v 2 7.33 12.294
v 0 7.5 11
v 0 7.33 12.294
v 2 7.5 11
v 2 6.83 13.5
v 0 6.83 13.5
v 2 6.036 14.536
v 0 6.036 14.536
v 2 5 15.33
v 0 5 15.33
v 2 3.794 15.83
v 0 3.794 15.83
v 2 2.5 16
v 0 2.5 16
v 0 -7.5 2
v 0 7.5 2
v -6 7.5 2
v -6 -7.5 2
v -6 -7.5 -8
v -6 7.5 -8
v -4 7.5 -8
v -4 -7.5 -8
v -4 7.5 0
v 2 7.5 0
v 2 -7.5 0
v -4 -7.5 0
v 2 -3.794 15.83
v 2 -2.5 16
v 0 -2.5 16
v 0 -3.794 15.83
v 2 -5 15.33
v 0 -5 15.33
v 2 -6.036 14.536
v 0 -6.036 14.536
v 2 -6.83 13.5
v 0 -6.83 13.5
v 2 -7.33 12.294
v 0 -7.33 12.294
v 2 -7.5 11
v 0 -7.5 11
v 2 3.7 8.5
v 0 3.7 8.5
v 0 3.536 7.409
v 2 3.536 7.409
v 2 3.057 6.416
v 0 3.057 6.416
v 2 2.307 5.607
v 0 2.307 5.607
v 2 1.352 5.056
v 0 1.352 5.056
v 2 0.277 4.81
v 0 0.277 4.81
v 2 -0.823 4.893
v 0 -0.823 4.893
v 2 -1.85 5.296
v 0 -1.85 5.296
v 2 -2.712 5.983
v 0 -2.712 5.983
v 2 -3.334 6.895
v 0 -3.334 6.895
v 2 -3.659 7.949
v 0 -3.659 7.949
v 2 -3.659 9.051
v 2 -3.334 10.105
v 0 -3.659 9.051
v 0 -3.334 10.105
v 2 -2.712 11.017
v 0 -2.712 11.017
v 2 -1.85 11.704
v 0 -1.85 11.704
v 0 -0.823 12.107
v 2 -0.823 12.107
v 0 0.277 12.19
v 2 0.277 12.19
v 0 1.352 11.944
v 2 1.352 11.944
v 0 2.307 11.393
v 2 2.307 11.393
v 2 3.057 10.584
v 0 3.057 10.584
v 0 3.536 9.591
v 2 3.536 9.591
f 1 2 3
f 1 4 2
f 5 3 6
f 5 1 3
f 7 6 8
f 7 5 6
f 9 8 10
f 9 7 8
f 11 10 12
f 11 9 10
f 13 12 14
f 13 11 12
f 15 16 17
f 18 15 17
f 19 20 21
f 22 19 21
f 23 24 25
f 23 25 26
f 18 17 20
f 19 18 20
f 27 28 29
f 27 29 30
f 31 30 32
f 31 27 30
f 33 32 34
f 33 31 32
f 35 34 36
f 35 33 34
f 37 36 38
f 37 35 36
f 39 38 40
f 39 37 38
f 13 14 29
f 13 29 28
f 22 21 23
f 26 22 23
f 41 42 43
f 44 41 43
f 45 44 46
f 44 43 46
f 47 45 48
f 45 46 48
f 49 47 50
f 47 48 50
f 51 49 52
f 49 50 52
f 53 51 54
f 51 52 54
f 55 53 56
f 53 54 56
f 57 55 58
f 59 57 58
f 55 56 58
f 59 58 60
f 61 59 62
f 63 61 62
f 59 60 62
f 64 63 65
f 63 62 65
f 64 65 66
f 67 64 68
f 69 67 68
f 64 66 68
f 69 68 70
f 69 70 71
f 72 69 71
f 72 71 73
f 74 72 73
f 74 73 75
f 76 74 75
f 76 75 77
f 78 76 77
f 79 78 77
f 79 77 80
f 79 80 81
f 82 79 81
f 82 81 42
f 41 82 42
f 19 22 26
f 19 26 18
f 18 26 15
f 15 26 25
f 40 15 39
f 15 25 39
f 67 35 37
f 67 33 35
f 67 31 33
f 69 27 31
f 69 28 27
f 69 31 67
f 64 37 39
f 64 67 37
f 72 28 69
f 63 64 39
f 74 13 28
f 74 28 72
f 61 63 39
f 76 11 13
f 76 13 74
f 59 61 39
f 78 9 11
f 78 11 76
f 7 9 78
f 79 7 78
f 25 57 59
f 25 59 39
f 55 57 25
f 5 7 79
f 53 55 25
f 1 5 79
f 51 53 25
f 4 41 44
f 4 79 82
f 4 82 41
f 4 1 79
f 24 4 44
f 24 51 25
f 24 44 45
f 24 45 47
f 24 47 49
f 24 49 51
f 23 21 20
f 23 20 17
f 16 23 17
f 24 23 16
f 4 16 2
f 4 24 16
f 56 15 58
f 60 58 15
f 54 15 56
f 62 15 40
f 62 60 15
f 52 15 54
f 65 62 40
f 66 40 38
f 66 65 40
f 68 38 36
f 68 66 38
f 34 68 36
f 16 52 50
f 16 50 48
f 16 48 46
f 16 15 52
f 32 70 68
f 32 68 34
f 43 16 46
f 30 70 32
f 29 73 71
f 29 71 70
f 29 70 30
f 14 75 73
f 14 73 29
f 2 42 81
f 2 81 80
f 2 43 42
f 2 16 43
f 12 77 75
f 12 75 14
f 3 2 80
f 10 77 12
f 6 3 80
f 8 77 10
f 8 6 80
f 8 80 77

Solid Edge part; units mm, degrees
sketch "Sketch1" plane through (0, 0, 0) normal (0, -1, 0) x (1, 0, 0)
  line L0 (2, 16) -> (2, 2)
  line L1 (2, 2) -> (2, 0)
  line L2 (2, 0) -> (0, 0)
  line L3 (-4, 0) -> (0, 0)
  line L4 (-4, -8) -> (-4, 0)
  line L5 (-6, -8) -> (-4, -8)
  line L6 (-6, 2) -> (-6, -8)
  line L7 (0, 2) -> (-6, 2)
  line L8 (0, 2) -> (0, 16)
  line L9 (0, 16) -> (2, 16)
extrude "Protrusion1" add sketch "Sketch1" along normal mid plane 15
sketch "Sketch2" plane through (0, 0, 0) normal (1, 0, 0) x (0, 1, 0)
  circle A0 centre (0, 8.5) radius 3.7
extrude "Cutout1" cut sketch "Sketch2" along normal up to next
fillet "Round_1" radius 5 2 edges at (1, -7.5, 16) (1, 7.5, 16)
